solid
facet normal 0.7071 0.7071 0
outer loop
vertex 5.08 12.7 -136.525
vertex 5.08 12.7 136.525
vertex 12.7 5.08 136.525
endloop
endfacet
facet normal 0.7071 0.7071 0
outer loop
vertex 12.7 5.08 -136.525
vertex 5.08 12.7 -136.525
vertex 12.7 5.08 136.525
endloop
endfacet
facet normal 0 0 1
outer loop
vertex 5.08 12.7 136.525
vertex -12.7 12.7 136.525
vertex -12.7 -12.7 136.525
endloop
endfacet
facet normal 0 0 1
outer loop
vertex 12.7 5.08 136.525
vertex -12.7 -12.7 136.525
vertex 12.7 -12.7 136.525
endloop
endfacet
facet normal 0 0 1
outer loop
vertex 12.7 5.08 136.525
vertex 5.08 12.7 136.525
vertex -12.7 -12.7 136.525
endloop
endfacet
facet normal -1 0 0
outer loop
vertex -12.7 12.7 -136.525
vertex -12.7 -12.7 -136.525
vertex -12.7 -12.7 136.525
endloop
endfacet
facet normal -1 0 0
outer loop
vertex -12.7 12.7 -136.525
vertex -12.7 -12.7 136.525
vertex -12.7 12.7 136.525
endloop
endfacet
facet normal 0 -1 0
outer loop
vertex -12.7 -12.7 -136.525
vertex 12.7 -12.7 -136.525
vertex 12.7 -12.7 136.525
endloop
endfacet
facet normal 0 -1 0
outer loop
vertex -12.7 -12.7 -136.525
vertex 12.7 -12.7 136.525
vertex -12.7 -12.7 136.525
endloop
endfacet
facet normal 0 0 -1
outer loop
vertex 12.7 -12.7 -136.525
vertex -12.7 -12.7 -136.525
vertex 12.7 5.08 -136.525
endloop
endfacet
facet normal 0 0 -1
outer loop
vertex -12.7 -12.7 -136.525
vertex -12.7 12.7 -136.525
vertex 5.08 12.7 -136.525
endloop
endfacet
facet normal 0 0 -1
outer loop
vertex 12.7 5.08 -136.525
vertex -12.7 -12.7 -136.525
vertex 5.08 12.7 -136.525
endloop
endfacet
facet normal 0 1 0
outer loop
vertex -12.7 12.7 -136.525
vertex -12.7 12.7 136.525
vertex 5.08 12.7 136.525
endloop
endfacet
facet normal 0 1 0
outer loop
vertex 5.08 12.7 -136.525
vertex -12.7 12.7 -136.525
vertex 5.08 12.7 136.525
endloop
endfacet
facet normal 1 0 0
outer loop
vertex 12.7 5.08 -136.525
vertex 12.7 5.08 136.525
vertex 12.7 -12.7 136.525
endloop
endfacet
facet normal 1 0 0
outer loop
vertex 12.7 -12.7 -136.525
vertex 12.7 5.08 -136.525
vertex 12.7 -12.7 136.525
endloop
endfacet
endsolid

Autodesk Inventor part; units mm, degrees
ref_plane "YZ Plane" through (0, 0, 0) normal (1, 0, 0) x (0, 1, 0)
ref_plane "XZ Plane" through (0, 0, 0) normal (0, 1, 0) x (-1, 0, 0)
ref_plane "XY Plane" through (0, 0, 0) normal (0, 0, 1) x (1, 0, 0)
sketch "Sketch1" plane through (0, 0, 0) normal (0, 0, 1) x (1, 0, 0)
  line L0 (12.7, -12.7) -> (-12.7, -12.7)
  line L1 (-12.7, -12.7) -> (-12.7, 12.7)
  line L2 (-12.7, 12.7) -> (5.08, 12.7)
  line L3 (12.7, 5.08) -> (12.7, -12.7)
  line L4 (12.7, -12.7) -> (-12.7, 12.7) construction
  line L5 (-12.7, -12.7) -> (12.7, 12.7) construction
  line L6 (5.08, 12.7) -> (12.7, 5.08)
  point P0 (0, 0)
  dimension "d0" = 25.4
  dimension "d1" = 25.4
  dimension "d2" = 7.62
  dimension "d3" = 7.62
extrude "Extrusion1" add sketch "Sketch1" along normal mid plane 273.05
equation "\"d3\" = d2"
properties part number "Shooter Base Cleat"
